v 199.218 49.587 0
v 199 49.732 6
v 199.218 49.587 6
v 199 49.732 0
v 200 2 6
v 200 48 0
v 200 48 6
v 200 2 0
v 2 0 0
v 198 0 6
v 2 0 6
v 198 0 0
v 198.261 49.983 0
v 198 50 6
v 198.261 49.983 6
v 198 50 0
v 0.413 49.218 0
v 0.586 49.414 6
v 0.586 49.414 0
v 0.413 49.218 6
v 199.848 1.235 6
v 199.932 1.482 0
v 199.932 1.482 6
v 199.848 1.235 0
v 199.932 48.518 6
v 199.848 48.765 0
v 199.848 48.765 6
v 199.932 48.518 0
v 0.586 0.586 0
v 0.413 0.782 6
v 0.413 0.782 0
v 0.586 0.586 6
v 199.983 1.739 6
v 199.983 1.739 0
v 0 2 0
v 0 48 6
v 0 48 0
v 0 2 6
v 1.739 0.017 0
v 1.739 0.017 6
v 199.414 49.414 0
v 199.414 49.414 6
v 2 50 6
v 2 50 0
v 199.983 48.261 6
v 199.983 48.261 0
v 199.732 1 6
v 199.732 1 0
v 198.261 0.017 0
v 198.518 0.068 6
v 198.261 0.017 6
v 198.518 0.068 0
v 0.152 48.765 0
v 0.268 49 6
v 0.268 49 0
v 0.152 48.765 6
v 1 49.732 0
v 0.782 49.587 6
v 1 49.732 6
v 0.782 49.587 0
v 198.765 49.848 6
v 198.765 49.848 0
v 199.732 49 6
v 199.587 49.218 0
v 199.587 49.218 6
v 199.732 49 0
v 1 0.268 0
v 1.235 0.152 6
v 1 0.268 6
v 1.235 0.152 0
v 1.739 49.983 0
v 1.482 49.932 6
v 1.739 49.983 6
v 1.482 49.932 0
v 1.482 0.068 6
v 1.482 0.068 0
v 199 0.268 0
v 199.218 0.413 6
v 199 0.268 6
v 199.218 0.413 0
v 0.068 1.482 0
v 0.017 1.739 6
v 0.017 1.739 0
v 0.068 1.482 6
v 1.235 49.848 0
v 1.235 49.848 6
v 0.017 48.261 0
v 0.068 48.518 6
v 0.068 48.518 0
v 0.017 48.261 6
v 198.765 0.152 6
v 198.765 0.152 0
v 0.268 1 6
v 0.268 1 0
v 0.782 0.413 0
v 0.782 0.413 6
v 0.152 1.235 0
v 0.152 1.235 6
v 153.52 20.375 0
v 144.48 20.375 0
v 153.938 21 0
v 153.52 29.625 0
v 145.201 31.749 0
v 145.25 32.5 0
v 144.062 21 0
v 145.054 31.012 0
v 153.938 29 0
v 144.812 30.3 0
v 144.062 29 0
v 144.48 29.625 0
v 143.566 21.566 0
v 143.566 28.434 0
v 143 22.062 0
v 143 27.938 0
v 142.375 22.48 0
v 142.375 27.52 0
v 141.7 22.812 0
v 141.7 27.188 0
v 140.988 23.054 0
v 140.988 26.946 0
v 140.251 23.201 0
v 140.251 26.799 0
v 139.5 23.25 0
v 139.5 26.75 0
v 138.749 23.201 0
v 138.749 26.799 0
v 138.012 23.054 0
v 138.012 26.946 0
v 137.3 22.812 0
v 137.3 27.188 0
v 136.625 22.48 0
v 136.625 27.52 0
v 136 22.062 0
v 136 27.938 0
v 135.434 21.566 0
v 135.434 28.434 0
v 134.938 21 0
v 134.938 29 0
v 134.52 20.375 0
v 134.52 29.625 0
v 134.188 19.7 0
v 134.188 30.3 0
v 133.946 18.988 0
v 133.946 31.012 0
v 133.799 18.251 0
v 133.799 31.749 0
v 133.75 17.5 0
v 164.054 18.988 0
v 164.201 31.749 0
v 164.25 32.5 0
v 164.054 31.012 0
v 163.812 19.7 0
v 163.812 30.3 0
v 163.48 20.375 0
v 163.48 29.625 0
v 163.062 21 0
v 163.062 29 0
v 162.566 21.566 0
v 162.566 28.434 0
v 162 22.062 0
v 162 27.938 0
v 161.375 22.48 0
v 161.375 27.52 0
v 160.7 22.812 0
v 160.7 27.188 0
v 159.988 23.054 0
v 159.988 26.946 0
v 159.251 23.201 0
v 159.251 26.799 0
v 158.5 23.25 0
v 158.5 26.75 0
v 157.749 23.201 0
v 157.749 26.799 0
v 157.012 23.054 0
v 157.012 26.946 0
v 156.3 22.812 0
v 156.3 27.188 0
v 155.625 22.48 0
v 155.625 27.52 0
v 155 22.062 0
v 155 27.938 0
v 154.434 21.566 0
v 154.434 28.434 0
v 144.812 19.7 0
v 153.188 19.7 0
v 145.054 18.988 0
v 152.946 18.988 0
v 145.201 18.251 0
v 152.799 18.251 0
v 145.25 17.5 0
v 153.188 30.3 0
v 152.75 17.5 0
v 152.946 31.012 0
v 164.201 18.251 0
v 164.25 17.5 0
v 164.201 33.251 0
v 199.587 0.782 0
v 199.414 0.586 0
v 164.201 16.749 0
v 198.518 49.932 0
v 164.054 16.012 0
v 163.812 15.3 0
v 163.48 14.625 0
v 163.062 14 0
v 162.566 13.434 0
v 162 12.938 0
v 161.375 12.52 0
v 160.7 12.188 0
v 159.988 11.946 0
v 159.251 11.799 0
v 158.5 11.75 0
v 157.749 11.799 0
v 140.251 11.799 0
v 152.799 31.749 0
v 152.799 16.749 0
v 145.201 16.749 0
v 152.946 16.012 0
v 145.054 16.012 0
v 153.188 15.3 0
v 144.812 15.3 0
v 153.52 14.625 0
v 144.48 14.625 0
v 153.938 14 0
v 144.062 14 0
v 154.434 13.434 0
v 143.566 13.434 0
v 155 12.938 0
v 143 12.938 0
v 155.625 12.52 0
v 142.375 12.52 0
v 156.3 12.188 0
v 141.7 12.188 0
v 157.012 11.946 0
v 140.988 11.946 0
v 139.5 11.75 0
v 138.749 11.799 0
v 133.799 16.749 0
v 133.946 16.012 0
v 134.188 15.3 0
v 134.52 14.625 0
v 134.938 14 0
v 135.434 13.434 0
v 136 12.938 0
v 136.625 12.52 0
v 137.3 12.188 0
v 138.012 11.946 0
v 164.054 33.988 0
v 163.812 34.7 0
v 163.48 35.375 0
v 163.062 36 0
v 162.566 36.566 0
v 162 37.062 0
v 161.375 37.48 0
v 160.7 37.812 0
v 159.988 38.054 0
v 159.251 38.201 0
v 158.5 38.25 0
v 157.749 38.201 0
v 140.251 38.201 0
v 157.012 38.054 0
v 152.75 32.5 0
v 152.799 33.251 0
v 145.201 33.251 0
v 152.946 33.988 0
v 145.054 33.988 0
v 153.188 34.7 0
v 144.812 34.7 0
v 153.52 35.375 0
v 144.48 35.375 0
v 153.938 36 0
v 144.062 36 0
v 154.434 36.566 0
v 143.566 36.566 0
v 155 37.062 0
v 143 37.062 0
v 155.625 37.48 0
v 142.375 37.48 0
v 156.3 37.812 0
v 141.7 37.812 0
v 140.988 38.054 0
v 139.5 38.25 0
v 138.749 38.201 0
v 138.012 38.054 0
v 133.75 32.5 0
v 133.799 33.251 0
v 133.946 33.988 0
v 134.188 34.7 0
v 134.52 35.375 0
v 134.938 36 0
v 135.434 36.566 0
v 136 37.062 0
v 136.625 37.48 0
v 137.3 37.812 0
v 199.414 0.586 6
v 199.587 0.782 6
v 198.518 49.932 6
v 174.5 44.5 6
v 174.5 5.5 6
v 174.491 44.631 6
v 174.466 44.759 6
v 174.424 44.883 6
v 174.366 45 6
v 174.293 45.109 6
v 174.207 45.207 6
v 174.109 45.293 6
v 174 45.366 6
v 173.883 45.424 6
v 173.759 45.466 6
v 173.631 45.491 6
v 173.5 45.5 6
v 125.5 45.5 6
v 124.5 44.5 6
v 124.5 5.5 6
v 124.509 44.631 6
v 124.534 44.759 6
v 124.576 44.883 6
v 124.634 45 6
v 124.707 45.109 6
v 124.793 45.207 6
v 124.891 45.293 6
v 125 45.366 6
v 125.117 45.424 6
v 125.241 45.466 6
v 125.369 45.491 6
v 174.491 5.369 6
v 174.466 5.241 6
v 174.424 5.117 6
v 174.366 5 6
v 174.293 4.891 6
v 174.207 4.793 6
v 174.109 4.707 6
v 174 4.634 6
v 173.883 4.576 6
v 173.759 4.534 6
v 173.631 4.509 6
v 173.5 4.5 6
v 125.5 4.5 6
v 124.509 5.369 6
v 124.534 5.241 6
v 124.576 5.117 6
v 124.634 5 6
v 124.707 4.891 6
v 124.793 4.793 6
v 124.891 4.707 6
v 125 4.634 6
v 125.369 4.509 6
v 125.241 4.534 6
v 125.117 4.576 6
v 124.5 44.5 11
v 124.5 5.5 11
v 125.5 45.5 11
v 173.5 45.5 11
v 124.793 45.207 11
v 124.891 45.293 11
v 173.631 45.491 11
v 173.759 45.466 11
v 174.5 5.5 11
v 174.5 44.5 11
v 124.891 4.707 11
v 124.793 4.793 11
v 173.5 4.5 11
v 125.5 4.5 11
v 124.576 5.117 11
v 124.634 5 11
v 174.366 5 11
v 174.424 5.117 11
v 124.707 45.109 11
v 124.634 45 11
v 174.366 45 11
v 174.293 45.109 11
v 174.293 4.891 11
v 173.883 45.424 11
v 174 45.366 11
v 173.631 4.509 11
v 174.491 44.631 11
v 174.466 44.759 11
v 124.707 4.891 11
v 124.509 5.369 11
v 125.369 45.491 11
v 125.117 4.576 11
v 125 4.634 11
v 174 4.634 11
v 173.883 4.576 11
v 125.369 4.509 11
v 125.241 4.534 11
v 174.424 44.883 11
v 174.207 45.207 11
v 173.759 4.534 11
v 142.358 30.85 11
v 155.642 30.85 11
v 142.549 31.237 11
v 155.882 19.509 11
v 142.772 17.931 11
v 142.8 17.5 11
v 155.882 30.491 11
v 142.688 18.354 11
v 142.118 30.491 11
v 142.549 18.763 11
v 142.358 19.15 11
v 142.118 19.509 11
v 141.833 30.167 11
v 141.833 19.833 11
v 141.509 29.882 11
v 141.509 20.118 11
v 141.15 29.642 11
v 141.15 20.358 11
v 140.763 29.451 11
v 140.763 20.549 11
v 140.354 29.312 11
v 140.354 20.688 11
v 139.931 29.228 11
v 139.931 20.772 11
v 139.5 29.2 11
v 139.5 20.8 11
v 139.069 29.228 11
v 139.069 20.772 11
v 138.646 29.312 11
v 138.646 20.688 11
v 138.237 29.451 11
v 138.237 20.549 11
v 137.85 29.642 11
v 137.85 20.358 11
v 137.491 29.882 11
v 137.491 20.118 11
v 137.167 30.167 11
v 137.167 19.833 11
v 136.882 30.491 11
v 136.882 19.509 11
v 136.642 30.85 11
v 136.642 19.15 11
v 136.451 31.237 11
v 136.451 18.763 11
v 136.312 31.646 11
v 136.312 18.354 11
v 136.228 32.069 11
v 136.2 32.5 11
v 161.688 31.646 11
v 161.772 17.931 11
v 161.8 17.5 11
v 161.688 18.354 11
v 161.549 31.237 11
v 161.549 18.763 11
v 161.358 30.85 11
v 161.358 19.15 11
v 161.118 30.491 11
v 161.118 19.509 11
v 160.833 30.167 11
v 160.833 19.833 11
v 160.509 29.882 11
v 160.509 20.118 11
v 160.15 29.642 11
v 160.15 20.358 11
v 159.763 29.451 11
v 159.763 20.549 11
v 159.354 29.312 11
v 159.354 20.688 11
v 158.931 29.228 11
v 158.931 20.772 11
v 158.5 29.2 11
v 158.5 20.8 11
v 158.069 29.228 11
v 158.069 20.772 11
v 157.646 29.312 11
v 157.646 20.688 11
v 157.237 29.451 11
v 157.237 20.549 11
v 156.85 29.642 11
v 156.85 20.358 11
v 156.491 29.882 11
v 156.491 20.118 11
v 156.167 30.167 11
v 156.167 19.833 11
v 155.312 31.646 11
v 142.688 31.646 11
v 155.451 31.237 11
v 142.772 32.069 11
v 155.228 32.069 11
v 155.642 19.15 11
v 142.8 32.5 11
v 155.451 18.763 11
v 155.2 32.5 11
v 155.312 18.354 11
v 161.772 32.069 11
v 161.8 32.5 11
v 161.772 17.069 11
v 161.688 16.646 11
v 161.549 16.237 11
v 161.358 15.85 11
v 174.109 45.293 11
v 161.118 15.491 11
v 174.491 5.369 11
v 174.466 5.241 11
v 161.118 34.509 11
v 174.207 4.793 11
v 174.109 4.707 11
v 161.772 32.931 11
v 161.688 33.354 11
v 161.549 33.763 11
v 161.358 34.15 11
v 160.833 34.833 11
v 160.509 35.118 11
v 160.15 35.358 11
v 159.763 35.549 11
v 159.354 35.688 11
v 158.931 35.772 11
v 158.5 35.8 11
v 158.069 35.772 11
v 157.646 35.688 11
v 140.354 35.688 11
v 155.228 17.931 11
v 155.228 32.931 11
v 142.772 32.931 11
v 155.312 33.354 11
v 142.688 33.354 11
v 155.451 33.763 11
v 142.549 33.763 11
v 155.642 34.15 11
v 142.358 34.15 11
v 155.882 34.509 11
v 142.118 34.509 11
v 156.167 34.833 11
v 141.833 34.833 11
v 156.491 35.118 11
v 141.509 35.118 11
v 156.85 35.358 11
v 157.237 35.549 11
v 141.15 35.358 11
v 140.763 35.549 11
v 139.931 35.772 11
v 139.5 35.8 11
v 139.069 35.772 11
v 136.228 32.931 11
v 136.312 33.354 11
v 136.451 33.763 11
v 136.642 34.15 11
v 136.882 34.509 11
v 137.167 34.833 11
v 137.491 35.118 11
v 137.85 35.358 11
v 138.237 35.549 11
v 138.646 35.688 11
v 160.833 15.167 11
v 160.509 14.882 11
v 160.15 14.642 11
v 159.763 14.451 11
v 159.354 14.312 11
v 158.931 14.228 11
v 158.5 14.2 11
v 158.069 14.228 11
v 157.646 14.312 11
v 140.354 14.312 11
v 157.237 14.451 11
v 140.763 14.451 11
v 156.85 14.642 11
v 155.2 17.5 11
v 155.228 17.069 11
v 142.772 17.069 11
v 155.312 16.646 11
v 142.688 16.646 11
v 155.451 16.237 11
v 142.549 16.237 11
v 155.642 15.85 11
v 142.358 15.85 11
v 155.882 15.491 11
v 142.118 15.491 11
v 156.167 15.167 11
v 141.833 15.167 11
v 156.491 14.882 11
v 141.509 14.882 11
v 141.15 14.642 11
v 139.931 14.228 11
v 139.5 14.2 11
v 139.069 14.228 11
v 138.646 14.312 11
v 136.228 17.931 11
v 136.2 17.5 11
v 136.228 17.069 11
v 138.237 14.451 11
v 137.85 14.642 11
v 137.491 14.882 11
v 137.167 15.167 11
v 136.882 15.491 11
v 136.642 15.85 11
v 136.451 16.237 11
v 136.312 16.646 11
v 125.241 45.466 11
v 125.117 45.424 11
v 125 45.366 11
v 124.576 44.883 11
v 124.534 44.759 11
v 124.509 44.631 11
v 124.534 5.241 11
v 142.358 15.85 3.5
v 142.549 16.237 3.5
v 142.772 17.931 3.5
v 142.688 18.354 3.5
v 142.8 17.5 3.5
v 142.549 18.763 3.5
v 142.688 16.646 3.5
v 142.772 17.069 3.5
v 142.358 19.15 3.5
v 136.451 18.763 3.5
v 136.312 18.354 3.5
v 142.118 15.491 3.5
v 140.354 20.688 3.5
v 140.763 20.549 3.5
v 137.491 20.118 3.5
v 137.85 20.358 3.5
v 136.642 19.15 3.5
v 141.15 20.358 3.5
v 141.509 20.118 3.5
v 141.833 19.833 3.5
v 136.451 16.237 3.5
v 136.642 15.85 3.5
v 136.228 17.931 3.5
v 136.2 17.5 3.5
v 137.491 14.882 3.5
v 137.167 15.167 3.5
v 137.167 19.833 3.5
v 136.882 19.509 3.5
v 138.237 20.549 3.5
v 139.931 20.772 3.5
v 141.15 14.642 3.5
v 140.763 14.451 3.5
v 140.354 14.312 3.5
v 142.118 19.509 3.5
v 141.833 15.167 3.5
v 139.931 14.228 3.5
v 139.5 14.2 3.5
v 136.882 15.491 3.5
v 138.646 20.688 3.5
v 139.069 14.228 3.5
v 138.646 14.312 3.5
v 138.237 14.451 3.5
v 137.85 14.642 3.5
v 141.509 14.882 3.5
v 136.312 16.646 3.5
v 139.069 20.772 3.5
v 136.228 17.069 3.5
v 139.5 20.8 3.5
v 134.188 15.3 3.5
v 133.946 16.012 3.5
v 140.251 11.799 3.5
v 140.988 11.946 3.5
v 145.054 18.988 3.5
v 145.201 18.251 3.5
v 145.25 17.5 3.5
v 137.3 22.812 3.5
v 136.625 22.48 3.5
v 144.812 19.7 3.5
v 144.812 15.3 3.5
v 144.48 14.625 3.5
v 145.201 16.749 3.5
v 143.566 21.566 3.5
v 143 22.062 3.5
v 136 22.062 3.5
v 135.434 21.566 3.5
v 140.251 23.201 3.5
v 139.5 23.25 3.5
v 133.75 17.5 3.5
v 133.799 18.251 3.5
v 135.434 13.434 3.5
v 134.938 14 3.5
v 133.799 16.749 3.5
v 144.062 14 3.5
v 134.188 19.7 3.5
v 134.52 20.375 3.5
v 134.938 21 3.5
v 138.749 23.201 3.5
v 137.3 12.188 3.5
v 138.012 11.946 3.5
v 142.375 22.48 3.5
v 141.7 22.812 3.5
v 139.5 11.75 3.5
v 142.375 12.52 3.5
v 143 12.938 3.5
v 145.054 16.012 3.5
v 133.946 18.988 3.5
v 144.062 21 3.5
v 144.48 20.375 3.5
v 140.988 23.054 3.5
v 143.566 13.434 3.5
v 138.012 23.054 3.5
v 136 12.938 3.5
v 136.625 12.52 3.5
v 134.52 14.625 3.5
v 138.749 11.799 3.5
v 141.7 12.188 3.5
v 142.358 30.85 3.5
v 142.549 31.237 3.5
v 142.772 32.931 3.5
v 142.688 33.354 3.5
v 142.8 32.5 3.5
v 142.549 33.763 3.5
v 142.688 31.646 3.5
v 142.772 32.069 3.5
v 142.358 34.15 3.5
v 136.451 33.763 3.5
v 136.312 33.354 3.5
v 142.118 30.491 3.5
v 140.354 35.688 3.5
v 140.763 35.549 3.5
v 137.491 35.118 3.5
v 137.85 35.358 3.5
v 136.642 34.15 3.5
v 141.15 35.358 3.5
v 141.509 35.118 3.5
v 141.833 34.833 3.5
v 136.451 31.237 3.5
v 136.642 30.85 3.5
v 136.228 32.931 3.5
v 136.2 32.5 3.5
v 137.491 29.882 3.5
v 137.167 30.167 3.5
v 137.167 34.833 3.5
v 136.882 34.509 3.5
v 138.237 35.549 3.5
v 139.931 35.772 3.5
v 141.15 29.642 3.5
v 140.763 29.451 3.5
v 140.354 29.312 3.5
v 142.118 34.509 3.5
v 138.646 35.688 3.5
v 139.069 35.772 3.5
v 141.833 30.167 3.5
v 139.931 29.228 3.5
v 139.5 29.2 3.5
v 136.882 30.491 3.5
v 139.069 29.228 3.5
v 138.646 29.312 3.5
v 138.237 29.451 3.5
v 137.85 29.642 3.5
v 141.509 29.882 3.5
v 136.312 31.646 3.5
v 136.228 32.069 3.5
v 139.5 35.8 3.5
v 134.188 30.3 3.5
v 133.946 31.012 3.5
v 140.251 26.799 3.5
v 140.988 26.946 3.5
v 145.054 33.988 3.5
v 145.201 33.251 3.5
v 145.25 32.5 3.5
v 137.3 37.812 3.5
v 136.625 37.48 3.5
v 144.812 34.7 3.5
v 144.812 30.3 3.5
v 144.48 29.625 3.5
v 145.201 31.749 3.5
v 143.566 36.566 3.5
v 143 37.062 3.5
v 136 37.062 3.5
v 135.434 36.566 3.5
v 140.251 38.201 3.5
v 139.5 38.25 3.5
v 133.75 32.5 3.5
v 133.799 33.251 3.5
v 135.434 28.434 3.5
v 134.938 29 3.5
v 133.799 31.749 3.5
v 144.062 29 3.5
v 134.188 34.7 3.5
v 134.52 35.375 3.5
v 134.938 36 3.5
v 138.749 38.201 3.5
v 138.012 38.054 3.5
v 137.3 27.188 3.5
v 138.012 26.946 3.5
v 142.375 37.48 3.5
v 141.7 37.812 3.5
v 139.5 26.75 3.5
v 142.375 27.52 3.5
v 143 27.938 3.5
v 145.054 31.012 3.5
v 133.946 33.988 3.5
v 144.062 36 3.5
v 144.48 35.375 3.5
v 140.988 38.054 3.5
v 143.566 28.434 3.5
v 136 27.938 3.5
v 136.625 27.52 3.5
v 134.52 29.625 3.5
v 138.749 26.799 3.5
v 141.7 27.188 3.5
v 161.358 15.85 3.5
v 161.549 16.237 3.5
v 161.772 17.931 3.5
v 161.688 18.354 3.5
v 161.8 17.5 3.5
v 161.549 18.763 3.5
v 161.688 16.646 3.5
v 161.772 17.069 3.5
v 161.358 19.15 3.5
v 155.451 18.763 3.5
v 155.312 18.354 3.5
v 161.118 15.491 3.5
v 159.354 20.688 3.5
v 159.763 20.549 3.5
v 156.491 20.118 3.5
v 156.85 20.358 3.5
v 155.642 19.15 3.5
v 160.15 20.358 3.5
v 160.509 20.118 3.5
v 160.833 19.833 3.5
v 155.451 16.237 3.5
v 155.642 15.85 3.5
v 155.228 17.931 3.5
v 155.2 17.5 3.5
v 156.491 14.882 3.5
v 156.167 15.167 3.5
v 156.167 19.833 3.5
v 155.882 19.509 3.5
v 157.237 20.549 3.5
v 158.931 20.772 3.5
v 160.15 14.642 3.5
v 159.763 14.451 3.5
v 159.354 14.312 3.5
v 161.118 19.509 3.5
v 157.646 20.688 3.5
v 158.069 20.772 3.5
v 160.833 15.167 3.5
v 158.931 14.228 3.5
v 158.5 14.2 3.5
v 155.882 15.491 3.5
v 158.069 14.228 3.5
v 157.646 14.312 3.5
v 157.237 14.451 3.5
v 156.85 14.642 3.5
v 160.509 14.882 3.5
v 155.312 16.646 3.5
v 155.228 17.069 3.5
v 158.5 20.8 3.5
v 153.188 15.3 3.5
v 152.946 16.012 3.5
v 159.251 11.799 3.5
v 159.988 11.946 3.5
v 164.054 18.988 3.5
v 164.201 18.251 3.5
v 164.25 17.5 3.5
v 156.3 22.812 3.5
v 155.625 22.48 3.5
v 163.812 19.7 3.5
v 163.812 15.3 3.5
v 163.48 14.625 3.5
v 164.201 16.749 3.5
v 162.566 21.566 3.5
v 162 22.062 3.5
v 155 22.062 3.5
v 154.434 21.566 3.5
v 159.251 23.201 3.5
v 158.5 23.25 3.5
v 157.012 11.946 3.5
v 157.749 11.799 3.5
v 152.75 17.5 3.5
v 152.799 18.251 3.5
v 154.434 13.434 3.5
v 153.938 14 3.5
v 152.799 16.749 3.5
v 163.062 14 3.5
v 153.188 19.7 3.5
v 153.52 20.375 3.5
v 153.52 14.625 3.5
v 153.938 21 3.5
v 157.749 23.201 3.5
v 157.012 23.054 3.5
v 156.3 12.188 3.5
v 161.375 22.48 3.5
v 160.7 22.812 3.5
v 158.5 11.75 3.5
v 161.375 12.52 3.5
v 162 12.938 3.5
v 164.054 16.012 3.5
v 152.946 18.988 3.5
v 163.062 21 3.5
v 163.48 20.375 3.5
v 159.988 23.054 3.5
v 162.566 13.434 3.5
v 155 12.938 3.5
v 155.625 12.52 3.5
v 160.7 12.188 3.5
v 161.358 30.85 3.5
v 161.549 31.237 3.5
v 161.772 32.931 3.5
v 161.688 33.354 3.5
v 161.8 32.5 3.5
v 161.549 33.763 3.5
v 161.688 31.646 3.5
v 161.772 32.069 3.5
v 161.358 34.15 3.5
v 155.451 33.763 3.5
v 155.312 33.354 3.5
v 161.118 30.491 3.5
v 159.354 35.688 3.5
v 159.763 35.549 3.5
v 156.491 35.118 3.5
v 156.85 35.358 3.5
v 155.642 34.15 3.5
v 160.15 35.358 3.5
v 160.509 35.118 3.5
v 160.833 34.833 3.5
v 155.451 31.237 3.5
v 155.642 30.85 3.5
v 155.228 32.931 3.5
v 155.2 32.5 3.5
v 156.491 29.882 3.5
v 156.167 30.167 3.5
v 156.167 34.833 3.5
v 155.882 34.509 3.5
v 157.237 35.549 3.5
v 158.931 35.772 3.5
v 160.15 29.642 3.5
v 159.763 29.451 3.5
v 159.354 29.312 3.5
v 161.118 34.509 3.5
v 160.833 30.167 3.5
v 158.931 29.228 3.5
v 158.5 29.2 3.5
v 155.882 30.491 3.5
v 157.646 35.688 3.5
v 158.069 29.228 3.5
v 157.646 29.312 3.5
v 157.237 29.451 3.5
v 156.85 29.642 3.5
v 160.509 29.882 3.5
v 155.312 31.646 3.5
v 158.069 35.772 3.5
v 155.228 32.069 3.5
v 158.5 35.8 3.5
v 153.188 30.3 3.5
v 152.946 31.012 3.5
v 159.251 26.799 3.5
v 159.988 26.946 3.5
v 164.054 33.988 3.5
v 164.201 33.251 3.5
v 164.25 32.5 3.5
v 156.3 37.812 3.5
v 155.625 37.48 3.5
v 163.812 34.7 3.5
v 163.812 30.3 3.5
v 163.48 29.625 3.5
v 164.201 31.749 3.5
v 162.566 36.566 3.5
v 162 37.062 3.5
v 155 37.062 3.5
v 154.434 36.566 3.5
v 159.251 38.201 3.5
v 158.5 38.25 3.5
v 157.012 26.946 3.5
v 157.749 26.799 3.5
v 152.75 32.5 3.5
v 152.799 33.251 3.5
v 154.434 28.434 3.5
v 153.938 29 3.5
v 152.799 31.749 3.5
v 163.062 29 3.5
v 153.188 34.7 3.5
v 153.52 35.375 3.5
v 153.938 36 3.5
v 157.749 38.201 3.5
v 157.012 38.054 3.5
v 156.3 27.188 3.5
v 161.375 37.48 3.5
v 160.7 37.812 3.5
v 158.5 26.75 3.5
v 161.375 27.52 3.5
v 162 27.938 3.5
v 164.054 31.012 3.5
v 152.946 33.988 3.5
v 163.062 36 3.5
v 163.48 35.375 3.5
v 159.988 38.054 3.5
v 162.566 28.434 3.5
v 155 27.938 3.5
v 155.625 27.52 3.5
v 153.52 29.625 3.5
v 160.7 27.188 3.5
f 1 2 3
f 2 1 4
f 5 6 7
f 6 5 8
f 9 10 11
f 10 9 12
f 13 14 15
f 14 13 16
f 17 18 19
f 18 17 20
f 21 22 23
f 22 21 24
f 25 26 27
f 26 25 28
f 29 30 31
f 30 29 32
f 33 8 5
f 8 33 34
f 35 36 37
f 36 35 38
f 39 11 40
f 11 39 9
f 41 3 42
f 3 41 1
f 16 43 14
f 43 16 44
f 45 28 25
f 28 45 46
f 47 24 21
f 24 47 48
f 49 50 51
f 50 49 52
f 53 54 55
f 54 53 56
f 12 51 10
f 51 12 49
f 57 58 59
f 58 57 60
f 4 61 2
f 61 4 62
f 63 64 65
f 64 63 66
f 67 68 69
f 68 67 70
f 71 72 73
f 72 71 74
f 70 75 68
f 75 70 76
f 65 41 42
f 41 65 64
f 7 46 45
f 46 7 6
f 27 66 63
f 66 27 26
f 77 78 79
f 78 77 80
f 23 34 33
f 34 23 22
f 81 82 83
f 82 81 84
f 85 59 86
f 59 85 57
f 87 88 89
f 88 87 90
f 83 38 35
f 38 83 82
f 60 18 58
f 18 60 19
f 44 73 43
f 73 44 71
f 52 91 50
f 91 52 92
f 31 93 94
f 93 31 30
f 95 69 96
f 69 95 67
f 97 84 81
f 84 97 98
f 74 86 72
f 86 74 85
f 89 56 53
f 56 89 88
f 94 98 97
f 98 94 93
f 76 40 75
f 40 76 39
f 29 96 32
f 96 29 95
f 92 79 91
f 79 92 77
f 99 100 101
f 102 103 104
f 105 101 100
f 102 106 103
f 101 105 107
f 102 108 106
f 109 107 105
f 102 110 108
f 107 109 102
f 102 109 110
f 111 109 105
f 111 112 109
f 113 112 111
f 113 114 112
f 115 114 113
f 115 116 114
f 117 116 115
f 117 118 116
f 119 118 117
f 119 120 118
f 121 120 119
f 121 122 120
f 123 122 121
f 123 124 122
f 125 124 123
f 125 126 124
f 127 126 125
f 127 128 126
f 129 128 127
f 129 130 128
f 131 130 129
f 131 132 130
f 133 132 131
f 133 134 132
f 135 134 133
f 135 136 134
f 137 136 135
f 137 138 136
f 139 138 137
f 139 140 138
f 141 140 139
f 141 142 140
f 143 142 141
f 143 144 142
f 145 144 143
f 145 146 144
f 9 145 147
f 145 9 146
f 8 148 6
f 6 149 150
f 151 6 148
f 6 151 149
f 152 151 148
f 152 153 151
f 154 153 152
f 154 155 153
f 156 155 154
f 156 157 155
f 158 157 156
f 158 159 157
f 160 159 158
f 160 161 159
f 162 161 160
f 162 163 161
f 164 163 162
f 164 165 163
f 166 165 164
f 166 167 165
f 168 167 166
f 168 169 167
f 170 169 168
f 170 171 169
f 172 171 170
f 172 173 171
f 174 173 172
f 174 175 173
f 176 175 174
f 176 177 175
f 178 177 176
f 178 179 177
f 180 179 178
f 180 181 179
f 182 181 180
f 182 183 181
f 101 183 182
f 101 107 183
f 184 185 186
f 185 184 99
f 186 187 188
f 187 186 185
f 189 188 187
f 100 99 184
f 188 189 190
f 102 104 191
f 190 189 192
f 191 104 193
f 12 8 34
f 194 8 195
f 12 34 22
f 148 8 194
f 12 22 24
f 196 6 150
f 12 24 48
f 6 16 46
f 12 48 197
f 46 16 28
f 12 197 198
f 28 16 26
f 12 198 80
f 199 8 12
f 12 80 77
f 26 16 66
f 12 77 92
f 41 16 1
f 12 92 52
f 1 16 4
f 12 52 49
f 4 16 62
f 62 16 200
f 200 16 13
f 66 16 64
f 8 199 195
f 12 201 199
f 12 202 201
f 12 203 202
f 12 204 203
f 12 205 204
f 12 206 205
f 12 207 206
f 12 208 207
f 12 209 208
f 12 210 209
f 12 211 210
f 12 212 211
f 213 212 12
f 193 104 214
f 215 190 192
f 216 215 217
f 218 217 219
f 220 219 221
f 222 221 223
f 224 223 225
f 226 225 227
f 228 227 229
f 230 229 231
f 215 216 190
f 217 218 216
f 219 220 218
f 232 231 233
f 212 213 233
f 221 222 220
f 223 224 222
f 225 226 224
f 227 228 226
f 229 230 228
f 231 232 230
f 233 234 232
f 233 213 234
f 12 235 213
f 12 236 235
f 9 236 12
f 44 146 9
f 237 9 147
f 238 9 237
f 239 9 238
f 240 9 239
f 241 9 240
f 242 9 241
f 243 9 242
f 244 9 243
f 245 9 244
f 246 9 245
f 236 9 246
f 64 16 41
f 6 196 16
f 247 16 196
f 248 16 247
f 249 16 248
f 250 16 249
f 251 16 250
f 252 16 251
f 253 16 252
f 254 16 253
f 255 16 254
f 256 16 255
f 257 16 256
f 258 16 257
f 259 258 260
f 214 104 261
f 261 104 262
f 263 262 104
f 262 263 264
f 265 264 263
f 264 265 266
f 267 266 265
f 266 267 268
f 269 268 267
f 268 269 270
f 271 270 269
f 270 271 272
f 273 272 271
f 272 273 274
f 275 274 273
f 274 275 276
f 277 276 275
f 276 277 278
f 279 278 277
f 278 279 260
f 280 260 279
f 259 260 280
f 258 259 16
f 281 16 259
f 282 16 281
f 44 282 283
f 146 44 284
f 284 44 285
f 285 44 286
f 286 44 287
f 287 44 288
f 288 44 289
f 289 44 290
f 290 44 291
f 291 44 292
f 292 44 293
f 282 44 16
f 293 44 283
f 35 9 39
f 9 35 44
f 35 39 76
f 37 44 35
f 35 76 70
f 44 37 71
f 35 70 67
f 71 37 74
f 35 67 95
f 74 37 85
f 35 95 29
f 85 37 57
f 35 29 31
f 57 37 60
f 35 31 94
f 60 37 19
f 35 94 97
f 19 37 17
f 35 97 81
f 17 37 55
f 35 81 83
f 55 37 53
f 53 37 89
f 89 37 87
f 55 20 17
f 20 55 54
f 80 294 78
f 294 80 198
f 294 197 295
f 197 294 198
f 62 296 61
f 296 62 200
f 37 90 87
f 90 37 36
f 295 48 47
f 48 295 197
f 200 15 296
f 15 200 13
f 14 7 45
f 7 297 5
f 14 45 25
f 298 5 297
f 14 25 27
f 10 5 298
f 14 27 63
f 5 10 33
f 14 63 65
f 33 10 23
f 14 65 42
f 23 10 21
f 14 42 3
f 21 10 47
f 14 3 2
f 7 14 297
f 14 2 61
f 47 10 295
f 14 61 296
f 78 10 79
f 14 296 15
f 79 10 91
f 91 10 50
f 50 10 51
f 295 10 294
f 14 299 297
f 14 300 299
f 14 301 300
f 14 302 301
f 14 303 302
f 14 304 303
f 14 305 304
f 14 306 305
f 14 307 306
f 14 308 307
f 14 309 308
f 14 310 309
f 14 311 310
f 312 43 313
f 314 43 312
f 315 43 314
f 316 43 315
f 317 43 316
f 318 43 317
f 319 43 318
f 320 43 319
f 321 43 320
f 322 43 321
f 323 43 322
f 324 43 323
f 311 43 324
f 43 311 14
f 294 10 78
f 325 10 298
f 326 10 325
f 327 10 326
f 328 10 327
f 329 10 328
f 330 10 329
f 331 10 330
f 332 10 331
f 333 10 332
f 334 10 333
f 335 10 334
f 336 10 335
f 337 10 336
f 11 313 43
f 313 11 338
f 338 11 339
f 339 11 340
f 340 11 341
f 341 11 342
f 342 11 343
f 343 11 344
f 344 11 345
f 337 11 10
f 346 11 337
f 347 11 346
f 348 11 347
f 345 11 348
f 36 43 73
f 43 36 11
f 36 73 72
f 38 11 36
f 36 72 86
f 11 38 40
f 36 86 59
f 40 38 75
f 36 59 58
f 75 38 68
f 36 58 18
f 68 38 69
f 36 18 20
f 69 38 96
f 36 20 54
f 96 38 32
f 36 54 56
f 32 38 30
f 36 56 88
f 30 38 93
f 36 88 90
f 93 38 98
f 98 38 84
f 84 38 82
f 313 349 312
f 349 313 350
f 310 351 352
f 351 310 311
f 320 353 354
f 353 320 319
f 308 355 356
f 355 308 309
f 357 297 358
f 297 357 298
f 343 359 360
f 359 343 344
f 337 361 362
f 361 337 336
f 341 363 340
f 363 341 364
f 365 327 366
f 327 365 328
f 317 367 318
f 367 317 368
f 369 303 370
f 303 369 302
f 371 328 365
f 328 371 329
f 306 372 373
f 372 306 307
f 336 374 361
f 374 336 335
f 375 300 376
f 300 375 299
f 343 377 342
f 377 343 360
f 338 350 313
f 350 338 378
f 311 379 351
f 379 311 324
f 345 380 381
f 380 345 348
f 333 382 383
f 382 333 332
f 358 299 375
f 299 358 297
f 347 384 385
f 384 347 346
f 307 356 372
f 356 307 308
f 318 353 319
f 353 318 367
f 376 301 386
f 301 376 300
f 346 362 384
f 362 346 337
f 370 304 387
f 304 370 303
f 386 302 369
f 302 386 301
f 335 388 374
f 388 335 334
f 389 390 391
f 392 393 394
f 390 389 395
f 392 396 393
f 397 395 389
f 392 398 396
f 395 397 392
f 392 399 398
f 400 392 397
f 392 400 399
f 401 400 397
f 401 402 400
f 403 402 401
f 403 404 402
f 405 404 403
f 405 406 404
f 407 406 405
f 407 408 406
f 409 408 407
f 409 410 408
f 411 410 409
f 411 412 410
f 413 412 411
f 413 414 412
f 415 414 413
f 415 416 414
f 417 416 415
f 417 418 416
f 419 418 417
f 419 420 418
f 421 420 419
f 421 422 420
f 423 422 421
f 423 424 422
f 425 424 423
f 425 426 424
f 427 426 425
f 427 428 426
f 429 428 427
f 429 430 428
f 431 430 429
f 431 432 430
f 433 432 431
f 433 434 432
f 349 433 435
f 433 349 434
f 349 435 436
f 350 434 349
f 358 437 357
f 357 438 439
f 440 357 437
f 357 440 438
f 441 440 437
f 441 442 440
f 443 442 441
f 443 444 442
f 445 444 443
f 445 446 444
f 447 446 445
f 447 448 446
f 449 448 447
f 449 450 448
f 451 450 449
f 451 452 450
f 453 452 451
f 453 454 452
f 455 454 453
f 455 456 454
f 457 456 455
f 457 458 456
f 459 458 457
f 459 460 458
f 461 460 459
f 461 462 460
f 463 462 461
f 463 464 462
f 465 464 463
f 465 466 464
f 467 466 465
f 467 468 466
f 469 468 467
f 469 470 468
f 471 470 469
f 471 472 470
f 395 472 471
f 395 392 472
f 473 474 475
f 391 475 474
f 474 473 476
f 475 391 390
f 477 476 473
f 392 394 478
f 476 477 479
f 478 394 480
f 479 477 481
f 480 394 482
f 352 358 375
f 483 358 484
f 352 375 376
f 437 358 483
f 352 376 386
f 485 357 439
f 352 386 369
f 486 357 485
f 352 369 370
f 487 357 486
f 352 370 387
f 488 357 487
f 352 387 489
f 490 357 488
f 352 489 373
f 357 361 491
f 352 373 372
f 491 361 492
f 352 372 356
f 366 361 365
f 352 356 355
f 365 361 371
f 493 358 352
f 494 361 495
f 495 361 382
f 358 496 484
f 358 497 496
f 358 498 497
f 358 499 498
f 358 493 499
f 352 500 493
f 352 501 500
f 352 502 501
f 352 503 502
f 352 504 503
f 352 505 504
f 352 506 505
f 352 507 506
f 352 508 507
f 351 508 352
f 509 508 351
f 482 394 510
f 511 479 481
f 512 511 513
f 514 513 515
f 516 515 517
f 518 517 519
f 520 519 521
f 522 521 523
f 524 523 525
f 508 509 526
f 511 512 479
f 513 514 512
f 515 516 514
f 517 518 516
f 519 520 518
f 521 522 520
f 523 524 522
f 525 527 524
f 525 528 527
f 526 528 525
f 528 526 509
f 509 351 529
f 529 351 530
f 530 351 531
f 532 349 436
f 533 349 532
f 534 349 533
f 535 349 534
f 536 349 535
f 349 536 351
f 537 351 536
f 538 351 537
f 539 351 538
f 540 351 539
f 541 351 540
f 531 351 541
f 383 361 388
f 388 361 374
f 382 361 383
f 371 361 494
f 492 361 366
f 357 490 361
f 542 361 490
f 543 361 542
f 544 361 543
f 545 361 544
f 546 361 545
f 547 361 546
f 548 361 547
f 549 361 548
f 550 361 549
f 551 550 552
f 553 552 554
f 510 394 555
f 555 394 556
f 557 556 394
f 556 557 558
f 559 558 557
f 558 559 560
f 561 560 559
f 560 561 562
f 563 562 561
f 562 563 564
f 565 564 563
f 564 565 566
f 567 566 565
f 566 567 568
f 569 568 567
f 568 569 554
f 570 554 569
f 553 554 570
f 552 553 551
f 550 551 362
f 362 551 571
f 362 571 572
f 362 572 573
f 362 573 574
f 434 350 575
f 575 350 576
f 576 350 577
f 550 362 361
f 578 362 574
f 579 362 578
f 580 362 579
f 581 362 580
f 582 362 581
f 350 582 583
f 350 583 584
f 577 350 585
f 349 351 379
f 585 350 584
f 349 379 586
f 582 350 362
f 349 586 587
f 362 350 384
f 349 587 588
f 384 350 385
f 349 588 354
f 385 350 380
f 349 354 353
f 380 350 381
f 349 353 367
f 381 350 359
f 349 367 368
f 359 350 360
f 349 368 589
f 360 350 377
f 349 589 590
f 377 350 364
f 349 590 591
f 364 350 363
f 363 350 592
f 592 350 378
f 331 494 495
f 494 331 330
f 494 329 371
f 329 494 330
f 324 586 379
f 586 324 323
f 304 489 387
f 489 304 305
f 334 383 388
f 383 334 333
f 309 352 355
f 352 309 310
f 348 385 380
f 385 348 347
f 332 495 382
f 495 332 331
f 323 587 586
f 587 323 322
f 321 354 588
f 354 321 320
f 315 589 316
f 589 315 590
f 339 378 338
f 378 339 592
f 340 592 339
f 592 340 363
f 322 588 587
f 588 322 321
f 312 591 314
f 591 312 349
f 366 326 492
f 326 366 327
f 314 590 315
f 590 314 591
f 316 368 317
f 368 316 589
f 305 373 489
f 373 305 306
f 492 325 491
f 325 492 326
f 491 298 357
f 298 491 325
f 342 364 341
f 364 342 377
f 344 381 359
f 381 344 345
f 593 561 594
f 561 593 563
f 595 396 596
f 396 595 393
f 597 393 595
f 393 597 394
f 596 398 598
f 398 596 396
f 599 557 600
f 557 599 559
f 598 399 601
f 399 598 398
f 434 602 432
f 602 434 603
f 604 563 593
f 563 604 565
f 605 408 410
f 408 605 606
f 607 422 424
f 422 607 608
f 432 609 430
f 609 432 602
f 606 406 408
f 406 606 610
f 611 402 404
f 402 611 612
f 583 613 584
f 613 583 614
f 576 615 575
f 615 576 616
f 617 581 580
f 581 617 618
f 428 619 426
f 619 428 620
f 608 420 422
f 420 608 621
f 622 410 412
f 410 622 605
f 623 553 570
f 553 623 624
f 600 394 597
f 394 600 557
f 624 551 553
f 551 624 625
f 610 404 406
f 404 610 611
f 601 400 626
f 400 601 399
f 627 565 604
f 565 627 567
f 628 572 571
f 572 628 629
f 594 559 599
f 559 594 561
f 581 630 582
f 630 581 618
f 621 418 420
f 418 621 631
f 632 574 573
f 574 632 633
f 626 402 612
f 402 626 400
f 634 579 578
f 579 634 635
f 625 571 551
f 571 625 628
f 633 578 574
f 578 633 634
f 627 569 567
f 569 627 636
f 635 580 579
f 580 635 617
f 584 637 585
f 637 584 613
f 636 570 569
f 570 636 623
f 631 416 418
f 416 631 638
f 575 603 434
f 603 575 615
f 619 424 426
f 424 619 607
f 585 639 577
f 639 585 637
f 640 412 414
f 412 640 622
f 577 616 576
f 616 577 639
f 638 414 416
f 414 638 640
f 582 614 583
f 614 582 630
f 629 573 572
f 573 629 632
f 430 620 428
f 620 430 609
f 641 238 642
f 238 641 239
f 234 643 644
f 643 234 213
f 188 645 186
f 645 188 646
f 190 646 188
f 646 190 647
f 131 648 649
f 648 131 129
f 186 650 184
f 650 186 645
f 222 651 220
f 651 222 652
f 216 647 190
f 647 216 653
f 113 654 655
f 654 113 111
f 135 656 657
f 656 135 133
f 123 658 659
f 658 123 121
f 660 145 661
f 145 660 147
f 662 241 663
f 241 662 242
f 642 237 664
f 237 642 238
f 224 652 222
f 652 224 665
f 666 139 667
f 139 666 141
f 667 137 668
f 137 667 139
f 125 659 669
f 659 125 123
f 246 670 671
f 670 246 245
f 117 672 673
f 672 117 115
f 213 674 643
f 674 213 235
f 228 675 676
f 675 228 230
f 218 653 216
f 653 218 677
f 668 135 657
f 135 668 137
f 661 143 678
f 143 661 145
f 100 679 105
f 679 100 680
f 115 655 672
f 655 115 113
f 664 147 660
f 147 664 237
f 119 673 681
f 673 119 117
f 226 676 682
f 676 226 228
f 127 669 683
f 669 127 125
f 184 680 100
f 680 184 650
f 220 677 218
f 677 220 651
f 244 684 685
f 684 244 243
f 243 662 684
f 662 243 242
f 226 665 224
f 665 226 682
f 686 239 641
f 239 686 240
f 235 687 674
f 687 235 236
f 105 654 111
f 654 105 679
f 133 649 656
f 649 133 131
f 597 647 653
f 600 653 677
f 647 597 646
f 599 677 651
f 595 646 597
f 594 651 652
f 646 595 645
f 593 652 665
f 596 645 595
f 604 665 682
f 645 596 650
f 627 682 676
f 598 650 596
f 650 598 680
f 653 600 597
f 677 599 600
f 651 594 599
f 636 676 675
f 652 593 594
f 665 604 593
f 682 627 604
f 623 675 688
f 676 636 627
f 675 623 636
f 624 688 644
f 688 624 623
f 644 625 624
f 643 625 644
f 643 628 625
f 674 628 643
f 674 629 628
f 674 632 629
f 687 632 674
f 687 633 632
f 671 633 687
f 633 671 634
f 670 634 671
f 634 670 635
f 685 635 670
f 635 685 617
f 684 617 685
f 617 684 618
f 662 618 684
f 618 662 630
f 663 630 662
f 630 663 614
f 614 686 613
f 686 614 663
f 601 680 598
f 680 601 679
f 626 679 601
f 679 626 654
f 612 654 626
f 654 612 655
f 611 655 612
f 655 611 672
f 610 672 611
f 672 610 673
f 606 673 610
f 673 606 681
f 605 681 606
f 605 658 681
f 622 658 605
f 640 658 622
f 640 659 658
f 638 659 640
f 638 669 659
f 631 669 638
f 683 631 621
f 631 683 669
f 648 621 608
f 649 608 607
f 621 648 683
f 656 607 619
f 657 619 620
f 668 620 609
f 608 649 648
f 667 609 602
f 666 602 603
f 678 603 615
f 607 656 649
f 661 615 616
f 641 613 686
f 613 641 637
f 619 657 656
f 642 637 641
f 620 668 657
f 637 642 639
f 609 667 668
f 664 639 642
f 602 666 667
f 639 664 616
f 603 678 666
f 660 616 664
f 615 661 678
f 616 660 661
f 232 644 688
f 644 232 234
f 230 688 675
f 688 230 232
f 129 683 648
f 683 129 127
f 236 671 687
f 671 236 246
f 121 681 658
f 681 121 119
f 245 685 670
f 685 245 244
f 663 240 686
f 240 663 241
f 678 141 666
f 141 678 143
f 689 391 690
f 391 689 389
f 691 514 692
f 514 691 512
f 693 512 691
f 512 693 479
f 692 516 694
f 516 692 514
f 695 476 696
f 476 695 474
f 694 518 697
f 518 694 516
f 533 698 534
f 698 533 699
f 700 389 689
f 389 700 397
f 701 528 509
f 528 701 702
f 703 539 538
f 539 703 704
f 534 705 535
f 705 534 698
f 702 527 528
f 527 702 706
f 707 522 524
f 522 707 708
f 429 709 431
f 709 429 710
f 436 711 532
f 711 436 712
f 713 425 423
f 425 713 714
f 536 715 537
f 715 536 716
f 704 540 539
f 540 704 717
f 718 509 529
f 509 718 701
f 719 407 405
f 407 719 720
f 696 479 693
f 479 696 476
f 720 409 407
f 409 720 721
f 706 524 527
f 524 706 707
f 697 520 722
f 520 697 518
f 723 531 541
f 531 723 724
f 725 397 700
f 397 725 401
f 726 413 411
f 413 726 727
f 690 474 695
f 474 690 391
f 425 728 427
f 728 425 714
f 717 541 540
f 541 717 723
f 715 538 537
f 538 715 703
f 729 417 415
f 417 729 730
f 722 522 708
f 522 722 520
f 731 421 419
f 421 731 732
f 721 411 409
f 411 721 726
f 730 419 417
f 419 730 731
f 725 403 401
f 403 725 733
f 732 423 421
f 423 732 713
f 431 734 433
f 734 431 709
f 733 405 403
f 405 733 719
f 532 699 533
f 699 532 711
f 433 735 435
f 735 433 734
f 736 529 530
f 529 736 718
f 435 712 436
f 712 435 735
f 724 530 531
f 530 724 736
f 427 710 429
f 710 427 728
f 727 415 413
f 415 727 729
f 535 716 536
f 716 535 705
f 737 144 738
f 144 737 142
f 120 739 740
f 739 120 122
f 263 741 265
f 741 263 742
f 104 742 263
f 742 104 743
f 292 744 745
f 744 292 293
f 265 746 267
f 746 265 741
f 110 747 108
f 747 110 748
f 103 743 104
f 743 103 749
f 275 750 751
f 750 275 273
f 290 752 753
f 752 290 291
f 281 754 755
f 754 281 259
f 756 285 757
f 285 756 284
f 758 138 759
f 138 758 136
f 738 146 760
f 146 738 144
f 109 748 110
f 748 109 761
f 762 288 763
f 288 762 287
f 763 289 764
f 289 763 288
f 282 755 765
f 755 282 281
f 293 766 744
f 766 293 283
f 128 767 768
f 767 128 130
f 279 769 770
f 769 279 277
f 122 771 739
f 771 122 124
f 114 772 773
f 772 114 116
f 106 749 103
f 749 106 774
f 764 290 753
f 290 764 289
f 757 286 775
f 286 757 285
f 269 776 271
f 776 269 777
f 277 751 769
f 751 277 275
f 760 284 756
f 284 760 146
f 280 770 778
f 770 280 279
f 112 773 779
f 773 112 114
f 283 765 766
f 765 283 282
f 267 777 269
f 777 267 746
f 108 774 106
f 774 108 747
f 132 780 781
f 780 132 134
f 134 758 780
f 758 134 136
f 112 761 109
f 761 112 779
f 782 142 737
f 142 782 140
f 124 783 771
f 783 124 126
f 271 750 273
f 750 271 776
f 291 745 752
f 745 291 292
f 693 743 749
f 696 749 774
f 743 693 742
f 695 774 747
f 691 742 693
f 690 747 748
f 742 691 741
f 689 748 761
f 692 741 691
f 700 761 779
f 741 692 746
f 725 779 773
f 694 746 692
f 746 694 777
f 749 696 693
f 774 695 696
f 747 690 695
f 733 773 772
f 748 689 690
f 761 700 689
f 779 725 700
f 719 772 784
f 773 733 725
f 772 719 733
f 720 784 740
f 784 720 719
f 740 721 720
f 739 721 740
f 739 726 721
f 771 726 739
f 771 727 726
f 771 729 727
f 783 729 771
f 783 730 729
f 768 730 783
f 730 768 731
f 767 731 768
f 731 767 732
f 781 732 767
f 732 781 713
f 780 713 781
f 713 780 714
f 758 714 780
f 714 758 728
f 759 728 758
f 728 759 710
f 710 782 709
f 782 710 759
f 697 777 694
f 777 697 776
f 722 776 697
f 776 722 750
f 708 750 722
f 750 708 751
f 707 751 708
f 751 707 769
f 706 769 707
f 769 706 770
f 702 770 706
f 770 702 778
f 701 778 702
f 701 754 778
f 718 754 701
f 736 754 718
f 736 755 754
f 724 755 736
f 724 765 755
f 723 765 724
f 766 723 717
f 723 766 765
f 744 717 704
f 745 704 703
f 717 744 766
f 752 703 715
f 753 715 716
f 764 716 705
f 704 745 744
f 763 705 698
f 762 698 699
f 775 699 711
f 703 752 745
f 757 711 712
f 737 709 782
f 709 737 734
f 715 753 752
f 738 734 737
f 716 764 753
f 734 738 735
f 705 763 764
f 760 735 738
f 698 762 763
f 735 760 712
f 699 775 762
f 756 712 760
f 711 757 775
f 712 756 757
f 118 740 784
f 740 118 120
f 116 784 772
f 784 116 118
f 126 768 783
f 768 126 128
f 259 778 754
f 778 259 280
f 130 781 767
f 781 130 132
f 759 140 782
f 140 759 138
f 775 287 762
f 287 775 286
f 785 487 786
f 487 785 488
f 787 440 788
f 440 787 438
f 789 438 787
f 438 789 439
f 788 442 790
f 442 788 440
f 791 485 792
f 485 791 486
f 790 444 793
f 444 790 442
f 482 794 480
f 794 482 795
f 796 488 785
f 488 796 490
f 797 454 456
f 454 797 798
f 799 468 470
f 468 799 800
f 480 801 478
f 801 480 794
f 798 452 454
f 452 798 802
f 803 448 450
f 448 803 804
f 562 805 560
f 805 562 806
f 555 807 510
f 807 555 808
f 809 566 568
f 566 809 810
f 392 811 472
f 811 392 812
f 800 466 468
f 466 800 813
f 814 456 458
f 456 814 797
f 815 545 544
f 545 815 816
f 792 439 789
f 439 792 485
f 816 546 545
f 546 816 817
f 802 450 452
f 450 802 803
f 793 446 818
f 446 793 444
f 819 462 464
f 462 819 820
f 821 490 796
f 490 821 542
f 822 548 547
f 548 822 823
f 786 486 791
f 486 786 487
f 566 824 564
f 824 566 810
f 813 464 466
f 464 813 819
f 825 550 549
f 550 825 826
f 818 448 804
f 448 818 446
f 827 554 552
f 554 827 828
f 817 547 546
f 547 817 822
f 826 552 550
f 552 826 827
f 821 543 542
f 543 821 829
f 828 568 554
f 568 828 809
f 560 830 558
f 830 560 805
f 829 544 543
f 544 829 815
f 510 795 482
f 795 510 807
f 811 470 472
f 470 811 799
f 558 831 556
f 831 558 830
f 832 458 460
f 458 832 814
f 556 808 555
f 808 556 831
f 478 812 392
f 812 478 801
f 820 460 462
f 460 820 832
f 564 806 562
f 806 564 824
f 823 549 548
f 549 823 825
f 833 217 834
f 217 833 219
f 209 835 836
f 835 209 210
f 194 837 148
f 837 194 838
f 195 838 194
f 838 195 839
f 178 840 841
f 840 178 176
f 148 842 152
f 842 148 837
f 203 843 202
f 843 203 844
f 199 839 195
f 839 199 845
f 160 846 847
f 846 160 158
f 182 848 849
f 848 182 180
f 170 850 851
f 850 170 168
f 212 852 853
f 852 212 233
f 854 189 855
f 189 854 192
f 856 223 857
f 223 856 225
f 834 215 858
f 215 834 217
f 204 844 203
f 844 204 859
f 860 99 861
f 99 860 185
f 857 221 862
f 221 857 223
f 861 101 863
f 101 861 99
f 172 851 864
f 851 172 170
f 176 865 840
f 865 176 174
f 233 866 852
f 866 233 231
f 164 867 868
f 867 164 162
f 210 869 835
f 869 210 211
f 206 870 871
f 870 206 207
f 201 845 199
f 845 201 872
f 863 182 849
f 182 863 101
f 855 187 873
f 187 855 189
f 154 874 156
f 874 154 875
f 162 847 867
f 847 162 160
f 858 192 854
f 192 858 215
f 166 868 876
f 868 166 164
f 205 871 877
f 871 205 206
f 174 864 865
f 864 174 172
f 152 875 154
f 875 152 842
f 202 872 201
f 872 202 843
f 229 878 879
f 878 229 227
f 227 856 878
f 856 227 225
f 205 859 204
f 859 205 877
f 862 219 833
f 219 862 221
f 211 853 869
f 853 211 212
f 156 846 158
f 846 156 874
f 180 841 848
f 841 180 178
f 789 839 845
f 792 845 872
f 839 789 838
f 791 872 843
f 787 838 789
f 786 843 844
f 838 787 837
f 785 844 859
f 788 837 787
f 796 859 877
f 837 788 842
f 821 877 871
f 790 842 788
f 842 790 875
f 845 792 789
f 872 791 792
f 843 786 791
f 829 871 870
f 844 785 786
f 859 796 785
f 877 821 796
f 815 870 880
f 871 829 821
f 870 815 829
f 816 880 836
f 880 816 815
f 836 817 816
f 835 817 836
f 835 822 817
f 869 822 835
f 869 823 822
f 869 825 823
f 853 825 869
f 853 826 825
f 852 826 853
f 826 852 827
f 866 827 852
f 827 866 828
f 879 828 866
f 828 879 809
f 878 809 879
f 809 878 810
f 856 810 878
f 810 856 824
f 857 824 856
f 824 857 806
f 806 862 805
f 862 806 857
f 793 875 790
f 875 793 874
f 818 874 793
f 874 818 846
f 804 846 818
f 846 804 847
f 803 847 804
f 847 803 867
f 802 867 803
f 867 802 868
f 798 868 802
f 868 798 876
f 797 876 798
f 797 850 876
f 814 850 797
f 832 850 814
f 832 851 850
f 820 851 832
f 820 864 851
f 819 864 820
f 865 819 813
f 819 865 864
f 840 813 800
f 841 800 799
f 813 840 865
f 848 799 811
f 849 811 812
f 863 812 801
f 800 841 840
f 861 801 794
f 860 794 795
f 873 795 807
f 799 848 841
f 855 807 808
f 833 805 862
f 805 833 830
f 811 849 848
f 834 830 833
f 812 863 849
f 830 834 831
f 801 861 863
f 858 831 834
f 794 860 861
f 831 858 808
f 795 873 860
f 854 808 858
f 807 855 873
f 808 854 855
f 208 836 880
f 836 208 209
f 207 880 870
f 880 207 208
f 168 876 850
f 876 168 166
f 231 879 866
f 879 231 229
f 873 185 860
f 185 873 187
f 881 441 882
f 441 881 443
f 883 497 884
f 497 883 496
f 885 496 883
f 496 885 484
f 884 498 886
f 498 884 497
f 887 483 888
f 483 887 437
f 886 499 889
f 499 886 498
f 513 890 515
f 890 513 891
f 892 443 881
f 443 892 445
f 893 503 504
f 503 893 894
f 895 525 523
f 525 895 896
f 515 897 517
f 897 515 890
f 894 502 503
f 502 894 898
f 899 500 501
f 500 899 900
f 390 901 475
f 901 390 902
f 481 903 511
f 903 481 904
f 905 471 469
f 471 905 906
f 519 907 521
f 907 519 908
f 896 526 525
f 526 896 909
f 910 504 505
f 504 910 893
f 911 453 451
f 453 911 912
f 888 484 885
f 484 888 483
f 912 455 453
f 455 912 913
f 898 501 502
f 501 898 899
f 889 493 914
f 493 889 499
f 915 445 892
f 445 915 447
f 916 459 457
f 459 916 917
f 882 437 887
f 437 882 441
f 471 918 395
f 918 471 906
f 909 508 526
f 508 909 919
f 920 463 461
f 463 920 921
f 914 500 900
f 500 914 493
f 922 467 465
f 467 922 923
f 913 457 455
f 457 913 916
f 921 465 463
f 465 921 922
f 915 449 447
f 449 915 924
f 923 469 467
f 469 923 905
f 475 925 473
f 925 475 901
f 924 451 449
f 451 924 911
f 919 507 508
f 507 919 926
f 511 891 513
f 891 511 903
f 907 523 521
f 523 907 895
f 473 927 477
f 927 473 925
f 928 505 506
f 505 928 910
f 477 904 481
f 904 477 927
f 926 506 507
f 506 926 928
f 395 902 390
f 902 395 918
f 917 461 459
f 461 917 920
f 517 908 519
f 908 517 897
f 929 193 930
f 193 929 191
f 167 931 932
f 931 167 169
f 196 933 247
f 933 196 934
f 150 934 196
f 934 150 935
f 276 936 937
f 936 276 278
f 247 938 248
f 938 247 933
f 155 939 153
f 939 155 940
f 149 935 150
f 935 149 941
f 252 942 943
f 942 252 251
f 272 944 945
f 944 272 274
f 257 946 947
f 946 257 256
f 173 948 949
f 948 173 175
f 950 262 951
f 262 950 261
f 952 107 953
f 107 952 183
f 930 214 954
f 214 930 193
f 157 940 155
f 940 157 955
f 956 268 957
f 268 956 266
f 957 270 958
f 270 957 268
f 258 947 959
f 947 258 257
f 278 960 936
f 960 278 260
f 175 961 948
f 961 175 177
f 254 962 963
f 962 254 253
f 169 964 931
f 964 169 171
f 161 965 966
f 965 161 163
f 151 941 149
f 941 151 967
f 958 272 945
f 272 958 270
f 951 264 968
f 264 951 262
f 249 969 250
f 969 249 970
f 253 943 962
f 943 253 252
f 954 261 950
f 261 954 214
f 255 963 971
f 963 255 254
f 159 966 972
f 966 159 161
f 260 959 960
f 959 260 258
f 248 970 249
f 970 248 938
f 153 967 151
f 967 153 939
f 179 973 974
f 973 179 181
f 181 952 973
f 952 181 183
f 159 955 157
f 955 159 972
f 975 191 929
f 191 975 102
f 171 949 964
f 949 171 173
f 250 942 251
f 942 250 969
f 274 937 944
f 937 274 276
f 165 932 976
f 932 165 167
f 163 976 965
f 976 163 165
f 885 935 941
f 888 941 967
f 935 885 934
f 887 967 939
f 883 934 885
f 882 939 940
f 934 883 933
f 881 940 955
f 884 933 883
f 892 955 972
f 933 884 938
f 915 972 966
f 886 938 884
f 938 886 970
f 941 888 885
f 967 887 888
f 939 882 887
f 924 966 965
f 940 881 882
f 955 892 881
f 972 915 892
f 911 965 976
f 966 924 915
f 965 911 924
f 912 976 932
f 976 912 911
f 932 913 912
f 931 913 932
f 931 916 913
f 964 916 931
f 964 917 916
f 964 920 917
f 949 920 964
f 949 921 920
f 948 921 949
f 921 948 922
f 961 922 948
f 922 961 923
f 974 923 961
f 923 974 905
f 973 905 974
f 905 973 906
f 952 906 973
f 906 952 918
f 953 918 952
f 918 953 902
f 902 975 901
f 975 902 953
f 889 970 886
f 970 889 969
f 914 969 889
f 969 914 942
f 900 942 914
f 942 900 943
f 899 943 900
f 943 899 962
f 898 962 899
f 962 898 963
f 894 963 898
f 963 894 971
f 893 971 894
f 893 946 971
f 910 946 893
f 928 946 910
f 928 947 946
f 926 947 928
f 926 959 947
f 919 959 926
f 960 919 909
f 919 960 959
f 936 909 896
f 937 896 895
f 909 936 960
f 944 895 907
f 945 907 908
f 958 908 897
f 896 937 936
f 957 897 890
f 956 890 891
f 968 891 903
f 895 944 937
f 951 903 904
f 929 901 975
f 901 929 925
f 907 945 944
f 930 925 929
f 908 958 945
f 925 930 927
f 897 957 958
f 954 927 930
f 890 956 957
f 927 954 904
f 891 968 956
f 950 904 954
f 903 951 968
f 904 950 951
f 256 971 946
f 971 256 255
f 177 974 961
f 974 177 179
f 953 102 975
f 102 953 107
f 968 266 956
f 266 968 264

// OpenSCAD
// file: rail_spec.scad
// ===== 레일 플랫폼 방식 공용 파라미터 =====
// 핵심 개념: 침대를 들지 않고 굴려서 올라가는 2개의 계량 레일.
//   각 레일 = 알루미늄 프로파일 빔 + 양 끝단 아래 로드셀 2개
//   침대 좌/우 바퀴가 각각 레일 위를 굴러 들어가 크래들에 안착.
//   총 로드셀 4개 = 좌레일 앞/뒤 + 우레일 앞/뒤
//   총중량 = 4개 합 / 무게중심 = 모멘트 계산

// --- 로드셀 CAS BCA-100L ---
L_len=150; L_wid=35; L_thk=40;
L_pitch_x=19; L_pitch_y=15;
L_free_x1=16.5; L_free_x2=35.5;   // 자유단(상면 탭)
L_fix_x1=114.5; L_fix_x2=133.5;   // 고정단(하면 탭)

// --- 스택 높이 ---
PAD_thk    = 6;    // 바닥 패드 두께
SPACER_h   = 5;    // 로드셀 고정단 단상
BRACKET_t  = 6;    // 레일-로드셀 연결 브래킷 두께
RAIL_h     = 30;   // 알루미늄 프로파일 높이 (30x60 사용)
RAIL_w     = 60;   // 프로파일 폭 (바퀴 두께 22mm + 여유)
DECK_Z = PAD_thk + SPACER_h + L_thk + BRACKET_t + RAIL_h;   // = 87

// --- 레일 전체 ---
CASTER_PITCH = 1700;   // 침대 앞뒤 캐스터 간격
RAMP_ANG = 15;
RAMP_len = DECK_Z / tan(RAMP_ANG);      // 약 325mm
RAIL_len = CASTER_PITCH + 400;          // 캐스터간격 + 양끝 여유

// --- 바퀴 ---
wheel_d=60; wheel_thk=22;   // 실측 후 교체
CRADLE_depth = 9;           // 얕은 크래들: 굴러 넘어갈 수 있되 안착은 되게
// main file
// ===== 레일-로드셀 마운트 세트 =====
// part="pad"     : 바닥 패드 + 로드셀 고정단 단상 (하면 카운터보어)
// part="bracket" : 로드셀 자유단 상면 <-> 알루미늄 레일 연결 브래킷
include <rail_spec.scad>
part = "pad";
$fn=48;

module rbox(l,w,h,r){ hull() for(x=[r,l-r]) for(y=[r,w-r]) translate([x,y,0]) cylinder(r=r,h=h); }

// ---------- 바닥 패드 ----------
pad_l = 200; pad_w = 50;
lc_x  = 25;                    // 패드 좌측 ~ 로드셀 좌측
sp_l  = 50; sp_w = 41;

module pad(){
    fx1=lc_x+L_fix_x1; fx2=lc_x+L_fix_x2;
    fy1=pad_w/2-L_pitch_y/2; fy2=pad_w/2+L_pitch_y/2;
    echo(str("패드 ",pad_l,"x",pad_w,"x",PAD_thk," / 단상 ",SPACER_h));
    difference(){
        union(){
            rbox(pad_l,pad_w,PAD_thk,2);
            translate([fx1-15,(pad_w-sp_w)/2,PAD_thk]) rbox(sp_l,sp_w,SPACER_h,1);
        }
        for(px=[fx1,fx2]) for(py=[fy1,fy2]){
            translate([px,py,-1]) cylinder(d=6.6,h=PAD_thk+SPACER_h+2);
            translate([px,py,-1]) cylinder(d=11.5,h=4.5);   // 바닥쪽 카운터보어
        }
    }
}

// ---------- 레일 브래킷 ----------
br_l = 90; br_w = RAIL_w;
module bracket(){
    echo(str("브래킷 ",br_l,"x",br_w,"x",BRACKET_t));
    difference(){
        rbox(br_l,br_w,BRACKET_t,2);
        // 로드셀 자유단 M6 4개 (중앙 19x15) - 상면 카운터보어
        for(dx=[-L_pitch_x/2,L_pitch_x/2]) for(dy=[-L_pitch_y/2,L_pitch_y/2]){
            translate([br_l/2+dx, br_w/2+dy, -1]) cylinder(d=6.6,h=BRACKET_t+2);
        }
        // 레일 T너트 체결 M5 x4 (모서리, 홀 패턴과 간섭 없음)
        for(dx=[14, br_l-14]) for(dy=[12, br_w-12])
            translate([dx,dy,-1]) cylinder(d=5.3,h=BRACKET_t+2);
    }
}
if(part=="pad") pad(); else bracket();
